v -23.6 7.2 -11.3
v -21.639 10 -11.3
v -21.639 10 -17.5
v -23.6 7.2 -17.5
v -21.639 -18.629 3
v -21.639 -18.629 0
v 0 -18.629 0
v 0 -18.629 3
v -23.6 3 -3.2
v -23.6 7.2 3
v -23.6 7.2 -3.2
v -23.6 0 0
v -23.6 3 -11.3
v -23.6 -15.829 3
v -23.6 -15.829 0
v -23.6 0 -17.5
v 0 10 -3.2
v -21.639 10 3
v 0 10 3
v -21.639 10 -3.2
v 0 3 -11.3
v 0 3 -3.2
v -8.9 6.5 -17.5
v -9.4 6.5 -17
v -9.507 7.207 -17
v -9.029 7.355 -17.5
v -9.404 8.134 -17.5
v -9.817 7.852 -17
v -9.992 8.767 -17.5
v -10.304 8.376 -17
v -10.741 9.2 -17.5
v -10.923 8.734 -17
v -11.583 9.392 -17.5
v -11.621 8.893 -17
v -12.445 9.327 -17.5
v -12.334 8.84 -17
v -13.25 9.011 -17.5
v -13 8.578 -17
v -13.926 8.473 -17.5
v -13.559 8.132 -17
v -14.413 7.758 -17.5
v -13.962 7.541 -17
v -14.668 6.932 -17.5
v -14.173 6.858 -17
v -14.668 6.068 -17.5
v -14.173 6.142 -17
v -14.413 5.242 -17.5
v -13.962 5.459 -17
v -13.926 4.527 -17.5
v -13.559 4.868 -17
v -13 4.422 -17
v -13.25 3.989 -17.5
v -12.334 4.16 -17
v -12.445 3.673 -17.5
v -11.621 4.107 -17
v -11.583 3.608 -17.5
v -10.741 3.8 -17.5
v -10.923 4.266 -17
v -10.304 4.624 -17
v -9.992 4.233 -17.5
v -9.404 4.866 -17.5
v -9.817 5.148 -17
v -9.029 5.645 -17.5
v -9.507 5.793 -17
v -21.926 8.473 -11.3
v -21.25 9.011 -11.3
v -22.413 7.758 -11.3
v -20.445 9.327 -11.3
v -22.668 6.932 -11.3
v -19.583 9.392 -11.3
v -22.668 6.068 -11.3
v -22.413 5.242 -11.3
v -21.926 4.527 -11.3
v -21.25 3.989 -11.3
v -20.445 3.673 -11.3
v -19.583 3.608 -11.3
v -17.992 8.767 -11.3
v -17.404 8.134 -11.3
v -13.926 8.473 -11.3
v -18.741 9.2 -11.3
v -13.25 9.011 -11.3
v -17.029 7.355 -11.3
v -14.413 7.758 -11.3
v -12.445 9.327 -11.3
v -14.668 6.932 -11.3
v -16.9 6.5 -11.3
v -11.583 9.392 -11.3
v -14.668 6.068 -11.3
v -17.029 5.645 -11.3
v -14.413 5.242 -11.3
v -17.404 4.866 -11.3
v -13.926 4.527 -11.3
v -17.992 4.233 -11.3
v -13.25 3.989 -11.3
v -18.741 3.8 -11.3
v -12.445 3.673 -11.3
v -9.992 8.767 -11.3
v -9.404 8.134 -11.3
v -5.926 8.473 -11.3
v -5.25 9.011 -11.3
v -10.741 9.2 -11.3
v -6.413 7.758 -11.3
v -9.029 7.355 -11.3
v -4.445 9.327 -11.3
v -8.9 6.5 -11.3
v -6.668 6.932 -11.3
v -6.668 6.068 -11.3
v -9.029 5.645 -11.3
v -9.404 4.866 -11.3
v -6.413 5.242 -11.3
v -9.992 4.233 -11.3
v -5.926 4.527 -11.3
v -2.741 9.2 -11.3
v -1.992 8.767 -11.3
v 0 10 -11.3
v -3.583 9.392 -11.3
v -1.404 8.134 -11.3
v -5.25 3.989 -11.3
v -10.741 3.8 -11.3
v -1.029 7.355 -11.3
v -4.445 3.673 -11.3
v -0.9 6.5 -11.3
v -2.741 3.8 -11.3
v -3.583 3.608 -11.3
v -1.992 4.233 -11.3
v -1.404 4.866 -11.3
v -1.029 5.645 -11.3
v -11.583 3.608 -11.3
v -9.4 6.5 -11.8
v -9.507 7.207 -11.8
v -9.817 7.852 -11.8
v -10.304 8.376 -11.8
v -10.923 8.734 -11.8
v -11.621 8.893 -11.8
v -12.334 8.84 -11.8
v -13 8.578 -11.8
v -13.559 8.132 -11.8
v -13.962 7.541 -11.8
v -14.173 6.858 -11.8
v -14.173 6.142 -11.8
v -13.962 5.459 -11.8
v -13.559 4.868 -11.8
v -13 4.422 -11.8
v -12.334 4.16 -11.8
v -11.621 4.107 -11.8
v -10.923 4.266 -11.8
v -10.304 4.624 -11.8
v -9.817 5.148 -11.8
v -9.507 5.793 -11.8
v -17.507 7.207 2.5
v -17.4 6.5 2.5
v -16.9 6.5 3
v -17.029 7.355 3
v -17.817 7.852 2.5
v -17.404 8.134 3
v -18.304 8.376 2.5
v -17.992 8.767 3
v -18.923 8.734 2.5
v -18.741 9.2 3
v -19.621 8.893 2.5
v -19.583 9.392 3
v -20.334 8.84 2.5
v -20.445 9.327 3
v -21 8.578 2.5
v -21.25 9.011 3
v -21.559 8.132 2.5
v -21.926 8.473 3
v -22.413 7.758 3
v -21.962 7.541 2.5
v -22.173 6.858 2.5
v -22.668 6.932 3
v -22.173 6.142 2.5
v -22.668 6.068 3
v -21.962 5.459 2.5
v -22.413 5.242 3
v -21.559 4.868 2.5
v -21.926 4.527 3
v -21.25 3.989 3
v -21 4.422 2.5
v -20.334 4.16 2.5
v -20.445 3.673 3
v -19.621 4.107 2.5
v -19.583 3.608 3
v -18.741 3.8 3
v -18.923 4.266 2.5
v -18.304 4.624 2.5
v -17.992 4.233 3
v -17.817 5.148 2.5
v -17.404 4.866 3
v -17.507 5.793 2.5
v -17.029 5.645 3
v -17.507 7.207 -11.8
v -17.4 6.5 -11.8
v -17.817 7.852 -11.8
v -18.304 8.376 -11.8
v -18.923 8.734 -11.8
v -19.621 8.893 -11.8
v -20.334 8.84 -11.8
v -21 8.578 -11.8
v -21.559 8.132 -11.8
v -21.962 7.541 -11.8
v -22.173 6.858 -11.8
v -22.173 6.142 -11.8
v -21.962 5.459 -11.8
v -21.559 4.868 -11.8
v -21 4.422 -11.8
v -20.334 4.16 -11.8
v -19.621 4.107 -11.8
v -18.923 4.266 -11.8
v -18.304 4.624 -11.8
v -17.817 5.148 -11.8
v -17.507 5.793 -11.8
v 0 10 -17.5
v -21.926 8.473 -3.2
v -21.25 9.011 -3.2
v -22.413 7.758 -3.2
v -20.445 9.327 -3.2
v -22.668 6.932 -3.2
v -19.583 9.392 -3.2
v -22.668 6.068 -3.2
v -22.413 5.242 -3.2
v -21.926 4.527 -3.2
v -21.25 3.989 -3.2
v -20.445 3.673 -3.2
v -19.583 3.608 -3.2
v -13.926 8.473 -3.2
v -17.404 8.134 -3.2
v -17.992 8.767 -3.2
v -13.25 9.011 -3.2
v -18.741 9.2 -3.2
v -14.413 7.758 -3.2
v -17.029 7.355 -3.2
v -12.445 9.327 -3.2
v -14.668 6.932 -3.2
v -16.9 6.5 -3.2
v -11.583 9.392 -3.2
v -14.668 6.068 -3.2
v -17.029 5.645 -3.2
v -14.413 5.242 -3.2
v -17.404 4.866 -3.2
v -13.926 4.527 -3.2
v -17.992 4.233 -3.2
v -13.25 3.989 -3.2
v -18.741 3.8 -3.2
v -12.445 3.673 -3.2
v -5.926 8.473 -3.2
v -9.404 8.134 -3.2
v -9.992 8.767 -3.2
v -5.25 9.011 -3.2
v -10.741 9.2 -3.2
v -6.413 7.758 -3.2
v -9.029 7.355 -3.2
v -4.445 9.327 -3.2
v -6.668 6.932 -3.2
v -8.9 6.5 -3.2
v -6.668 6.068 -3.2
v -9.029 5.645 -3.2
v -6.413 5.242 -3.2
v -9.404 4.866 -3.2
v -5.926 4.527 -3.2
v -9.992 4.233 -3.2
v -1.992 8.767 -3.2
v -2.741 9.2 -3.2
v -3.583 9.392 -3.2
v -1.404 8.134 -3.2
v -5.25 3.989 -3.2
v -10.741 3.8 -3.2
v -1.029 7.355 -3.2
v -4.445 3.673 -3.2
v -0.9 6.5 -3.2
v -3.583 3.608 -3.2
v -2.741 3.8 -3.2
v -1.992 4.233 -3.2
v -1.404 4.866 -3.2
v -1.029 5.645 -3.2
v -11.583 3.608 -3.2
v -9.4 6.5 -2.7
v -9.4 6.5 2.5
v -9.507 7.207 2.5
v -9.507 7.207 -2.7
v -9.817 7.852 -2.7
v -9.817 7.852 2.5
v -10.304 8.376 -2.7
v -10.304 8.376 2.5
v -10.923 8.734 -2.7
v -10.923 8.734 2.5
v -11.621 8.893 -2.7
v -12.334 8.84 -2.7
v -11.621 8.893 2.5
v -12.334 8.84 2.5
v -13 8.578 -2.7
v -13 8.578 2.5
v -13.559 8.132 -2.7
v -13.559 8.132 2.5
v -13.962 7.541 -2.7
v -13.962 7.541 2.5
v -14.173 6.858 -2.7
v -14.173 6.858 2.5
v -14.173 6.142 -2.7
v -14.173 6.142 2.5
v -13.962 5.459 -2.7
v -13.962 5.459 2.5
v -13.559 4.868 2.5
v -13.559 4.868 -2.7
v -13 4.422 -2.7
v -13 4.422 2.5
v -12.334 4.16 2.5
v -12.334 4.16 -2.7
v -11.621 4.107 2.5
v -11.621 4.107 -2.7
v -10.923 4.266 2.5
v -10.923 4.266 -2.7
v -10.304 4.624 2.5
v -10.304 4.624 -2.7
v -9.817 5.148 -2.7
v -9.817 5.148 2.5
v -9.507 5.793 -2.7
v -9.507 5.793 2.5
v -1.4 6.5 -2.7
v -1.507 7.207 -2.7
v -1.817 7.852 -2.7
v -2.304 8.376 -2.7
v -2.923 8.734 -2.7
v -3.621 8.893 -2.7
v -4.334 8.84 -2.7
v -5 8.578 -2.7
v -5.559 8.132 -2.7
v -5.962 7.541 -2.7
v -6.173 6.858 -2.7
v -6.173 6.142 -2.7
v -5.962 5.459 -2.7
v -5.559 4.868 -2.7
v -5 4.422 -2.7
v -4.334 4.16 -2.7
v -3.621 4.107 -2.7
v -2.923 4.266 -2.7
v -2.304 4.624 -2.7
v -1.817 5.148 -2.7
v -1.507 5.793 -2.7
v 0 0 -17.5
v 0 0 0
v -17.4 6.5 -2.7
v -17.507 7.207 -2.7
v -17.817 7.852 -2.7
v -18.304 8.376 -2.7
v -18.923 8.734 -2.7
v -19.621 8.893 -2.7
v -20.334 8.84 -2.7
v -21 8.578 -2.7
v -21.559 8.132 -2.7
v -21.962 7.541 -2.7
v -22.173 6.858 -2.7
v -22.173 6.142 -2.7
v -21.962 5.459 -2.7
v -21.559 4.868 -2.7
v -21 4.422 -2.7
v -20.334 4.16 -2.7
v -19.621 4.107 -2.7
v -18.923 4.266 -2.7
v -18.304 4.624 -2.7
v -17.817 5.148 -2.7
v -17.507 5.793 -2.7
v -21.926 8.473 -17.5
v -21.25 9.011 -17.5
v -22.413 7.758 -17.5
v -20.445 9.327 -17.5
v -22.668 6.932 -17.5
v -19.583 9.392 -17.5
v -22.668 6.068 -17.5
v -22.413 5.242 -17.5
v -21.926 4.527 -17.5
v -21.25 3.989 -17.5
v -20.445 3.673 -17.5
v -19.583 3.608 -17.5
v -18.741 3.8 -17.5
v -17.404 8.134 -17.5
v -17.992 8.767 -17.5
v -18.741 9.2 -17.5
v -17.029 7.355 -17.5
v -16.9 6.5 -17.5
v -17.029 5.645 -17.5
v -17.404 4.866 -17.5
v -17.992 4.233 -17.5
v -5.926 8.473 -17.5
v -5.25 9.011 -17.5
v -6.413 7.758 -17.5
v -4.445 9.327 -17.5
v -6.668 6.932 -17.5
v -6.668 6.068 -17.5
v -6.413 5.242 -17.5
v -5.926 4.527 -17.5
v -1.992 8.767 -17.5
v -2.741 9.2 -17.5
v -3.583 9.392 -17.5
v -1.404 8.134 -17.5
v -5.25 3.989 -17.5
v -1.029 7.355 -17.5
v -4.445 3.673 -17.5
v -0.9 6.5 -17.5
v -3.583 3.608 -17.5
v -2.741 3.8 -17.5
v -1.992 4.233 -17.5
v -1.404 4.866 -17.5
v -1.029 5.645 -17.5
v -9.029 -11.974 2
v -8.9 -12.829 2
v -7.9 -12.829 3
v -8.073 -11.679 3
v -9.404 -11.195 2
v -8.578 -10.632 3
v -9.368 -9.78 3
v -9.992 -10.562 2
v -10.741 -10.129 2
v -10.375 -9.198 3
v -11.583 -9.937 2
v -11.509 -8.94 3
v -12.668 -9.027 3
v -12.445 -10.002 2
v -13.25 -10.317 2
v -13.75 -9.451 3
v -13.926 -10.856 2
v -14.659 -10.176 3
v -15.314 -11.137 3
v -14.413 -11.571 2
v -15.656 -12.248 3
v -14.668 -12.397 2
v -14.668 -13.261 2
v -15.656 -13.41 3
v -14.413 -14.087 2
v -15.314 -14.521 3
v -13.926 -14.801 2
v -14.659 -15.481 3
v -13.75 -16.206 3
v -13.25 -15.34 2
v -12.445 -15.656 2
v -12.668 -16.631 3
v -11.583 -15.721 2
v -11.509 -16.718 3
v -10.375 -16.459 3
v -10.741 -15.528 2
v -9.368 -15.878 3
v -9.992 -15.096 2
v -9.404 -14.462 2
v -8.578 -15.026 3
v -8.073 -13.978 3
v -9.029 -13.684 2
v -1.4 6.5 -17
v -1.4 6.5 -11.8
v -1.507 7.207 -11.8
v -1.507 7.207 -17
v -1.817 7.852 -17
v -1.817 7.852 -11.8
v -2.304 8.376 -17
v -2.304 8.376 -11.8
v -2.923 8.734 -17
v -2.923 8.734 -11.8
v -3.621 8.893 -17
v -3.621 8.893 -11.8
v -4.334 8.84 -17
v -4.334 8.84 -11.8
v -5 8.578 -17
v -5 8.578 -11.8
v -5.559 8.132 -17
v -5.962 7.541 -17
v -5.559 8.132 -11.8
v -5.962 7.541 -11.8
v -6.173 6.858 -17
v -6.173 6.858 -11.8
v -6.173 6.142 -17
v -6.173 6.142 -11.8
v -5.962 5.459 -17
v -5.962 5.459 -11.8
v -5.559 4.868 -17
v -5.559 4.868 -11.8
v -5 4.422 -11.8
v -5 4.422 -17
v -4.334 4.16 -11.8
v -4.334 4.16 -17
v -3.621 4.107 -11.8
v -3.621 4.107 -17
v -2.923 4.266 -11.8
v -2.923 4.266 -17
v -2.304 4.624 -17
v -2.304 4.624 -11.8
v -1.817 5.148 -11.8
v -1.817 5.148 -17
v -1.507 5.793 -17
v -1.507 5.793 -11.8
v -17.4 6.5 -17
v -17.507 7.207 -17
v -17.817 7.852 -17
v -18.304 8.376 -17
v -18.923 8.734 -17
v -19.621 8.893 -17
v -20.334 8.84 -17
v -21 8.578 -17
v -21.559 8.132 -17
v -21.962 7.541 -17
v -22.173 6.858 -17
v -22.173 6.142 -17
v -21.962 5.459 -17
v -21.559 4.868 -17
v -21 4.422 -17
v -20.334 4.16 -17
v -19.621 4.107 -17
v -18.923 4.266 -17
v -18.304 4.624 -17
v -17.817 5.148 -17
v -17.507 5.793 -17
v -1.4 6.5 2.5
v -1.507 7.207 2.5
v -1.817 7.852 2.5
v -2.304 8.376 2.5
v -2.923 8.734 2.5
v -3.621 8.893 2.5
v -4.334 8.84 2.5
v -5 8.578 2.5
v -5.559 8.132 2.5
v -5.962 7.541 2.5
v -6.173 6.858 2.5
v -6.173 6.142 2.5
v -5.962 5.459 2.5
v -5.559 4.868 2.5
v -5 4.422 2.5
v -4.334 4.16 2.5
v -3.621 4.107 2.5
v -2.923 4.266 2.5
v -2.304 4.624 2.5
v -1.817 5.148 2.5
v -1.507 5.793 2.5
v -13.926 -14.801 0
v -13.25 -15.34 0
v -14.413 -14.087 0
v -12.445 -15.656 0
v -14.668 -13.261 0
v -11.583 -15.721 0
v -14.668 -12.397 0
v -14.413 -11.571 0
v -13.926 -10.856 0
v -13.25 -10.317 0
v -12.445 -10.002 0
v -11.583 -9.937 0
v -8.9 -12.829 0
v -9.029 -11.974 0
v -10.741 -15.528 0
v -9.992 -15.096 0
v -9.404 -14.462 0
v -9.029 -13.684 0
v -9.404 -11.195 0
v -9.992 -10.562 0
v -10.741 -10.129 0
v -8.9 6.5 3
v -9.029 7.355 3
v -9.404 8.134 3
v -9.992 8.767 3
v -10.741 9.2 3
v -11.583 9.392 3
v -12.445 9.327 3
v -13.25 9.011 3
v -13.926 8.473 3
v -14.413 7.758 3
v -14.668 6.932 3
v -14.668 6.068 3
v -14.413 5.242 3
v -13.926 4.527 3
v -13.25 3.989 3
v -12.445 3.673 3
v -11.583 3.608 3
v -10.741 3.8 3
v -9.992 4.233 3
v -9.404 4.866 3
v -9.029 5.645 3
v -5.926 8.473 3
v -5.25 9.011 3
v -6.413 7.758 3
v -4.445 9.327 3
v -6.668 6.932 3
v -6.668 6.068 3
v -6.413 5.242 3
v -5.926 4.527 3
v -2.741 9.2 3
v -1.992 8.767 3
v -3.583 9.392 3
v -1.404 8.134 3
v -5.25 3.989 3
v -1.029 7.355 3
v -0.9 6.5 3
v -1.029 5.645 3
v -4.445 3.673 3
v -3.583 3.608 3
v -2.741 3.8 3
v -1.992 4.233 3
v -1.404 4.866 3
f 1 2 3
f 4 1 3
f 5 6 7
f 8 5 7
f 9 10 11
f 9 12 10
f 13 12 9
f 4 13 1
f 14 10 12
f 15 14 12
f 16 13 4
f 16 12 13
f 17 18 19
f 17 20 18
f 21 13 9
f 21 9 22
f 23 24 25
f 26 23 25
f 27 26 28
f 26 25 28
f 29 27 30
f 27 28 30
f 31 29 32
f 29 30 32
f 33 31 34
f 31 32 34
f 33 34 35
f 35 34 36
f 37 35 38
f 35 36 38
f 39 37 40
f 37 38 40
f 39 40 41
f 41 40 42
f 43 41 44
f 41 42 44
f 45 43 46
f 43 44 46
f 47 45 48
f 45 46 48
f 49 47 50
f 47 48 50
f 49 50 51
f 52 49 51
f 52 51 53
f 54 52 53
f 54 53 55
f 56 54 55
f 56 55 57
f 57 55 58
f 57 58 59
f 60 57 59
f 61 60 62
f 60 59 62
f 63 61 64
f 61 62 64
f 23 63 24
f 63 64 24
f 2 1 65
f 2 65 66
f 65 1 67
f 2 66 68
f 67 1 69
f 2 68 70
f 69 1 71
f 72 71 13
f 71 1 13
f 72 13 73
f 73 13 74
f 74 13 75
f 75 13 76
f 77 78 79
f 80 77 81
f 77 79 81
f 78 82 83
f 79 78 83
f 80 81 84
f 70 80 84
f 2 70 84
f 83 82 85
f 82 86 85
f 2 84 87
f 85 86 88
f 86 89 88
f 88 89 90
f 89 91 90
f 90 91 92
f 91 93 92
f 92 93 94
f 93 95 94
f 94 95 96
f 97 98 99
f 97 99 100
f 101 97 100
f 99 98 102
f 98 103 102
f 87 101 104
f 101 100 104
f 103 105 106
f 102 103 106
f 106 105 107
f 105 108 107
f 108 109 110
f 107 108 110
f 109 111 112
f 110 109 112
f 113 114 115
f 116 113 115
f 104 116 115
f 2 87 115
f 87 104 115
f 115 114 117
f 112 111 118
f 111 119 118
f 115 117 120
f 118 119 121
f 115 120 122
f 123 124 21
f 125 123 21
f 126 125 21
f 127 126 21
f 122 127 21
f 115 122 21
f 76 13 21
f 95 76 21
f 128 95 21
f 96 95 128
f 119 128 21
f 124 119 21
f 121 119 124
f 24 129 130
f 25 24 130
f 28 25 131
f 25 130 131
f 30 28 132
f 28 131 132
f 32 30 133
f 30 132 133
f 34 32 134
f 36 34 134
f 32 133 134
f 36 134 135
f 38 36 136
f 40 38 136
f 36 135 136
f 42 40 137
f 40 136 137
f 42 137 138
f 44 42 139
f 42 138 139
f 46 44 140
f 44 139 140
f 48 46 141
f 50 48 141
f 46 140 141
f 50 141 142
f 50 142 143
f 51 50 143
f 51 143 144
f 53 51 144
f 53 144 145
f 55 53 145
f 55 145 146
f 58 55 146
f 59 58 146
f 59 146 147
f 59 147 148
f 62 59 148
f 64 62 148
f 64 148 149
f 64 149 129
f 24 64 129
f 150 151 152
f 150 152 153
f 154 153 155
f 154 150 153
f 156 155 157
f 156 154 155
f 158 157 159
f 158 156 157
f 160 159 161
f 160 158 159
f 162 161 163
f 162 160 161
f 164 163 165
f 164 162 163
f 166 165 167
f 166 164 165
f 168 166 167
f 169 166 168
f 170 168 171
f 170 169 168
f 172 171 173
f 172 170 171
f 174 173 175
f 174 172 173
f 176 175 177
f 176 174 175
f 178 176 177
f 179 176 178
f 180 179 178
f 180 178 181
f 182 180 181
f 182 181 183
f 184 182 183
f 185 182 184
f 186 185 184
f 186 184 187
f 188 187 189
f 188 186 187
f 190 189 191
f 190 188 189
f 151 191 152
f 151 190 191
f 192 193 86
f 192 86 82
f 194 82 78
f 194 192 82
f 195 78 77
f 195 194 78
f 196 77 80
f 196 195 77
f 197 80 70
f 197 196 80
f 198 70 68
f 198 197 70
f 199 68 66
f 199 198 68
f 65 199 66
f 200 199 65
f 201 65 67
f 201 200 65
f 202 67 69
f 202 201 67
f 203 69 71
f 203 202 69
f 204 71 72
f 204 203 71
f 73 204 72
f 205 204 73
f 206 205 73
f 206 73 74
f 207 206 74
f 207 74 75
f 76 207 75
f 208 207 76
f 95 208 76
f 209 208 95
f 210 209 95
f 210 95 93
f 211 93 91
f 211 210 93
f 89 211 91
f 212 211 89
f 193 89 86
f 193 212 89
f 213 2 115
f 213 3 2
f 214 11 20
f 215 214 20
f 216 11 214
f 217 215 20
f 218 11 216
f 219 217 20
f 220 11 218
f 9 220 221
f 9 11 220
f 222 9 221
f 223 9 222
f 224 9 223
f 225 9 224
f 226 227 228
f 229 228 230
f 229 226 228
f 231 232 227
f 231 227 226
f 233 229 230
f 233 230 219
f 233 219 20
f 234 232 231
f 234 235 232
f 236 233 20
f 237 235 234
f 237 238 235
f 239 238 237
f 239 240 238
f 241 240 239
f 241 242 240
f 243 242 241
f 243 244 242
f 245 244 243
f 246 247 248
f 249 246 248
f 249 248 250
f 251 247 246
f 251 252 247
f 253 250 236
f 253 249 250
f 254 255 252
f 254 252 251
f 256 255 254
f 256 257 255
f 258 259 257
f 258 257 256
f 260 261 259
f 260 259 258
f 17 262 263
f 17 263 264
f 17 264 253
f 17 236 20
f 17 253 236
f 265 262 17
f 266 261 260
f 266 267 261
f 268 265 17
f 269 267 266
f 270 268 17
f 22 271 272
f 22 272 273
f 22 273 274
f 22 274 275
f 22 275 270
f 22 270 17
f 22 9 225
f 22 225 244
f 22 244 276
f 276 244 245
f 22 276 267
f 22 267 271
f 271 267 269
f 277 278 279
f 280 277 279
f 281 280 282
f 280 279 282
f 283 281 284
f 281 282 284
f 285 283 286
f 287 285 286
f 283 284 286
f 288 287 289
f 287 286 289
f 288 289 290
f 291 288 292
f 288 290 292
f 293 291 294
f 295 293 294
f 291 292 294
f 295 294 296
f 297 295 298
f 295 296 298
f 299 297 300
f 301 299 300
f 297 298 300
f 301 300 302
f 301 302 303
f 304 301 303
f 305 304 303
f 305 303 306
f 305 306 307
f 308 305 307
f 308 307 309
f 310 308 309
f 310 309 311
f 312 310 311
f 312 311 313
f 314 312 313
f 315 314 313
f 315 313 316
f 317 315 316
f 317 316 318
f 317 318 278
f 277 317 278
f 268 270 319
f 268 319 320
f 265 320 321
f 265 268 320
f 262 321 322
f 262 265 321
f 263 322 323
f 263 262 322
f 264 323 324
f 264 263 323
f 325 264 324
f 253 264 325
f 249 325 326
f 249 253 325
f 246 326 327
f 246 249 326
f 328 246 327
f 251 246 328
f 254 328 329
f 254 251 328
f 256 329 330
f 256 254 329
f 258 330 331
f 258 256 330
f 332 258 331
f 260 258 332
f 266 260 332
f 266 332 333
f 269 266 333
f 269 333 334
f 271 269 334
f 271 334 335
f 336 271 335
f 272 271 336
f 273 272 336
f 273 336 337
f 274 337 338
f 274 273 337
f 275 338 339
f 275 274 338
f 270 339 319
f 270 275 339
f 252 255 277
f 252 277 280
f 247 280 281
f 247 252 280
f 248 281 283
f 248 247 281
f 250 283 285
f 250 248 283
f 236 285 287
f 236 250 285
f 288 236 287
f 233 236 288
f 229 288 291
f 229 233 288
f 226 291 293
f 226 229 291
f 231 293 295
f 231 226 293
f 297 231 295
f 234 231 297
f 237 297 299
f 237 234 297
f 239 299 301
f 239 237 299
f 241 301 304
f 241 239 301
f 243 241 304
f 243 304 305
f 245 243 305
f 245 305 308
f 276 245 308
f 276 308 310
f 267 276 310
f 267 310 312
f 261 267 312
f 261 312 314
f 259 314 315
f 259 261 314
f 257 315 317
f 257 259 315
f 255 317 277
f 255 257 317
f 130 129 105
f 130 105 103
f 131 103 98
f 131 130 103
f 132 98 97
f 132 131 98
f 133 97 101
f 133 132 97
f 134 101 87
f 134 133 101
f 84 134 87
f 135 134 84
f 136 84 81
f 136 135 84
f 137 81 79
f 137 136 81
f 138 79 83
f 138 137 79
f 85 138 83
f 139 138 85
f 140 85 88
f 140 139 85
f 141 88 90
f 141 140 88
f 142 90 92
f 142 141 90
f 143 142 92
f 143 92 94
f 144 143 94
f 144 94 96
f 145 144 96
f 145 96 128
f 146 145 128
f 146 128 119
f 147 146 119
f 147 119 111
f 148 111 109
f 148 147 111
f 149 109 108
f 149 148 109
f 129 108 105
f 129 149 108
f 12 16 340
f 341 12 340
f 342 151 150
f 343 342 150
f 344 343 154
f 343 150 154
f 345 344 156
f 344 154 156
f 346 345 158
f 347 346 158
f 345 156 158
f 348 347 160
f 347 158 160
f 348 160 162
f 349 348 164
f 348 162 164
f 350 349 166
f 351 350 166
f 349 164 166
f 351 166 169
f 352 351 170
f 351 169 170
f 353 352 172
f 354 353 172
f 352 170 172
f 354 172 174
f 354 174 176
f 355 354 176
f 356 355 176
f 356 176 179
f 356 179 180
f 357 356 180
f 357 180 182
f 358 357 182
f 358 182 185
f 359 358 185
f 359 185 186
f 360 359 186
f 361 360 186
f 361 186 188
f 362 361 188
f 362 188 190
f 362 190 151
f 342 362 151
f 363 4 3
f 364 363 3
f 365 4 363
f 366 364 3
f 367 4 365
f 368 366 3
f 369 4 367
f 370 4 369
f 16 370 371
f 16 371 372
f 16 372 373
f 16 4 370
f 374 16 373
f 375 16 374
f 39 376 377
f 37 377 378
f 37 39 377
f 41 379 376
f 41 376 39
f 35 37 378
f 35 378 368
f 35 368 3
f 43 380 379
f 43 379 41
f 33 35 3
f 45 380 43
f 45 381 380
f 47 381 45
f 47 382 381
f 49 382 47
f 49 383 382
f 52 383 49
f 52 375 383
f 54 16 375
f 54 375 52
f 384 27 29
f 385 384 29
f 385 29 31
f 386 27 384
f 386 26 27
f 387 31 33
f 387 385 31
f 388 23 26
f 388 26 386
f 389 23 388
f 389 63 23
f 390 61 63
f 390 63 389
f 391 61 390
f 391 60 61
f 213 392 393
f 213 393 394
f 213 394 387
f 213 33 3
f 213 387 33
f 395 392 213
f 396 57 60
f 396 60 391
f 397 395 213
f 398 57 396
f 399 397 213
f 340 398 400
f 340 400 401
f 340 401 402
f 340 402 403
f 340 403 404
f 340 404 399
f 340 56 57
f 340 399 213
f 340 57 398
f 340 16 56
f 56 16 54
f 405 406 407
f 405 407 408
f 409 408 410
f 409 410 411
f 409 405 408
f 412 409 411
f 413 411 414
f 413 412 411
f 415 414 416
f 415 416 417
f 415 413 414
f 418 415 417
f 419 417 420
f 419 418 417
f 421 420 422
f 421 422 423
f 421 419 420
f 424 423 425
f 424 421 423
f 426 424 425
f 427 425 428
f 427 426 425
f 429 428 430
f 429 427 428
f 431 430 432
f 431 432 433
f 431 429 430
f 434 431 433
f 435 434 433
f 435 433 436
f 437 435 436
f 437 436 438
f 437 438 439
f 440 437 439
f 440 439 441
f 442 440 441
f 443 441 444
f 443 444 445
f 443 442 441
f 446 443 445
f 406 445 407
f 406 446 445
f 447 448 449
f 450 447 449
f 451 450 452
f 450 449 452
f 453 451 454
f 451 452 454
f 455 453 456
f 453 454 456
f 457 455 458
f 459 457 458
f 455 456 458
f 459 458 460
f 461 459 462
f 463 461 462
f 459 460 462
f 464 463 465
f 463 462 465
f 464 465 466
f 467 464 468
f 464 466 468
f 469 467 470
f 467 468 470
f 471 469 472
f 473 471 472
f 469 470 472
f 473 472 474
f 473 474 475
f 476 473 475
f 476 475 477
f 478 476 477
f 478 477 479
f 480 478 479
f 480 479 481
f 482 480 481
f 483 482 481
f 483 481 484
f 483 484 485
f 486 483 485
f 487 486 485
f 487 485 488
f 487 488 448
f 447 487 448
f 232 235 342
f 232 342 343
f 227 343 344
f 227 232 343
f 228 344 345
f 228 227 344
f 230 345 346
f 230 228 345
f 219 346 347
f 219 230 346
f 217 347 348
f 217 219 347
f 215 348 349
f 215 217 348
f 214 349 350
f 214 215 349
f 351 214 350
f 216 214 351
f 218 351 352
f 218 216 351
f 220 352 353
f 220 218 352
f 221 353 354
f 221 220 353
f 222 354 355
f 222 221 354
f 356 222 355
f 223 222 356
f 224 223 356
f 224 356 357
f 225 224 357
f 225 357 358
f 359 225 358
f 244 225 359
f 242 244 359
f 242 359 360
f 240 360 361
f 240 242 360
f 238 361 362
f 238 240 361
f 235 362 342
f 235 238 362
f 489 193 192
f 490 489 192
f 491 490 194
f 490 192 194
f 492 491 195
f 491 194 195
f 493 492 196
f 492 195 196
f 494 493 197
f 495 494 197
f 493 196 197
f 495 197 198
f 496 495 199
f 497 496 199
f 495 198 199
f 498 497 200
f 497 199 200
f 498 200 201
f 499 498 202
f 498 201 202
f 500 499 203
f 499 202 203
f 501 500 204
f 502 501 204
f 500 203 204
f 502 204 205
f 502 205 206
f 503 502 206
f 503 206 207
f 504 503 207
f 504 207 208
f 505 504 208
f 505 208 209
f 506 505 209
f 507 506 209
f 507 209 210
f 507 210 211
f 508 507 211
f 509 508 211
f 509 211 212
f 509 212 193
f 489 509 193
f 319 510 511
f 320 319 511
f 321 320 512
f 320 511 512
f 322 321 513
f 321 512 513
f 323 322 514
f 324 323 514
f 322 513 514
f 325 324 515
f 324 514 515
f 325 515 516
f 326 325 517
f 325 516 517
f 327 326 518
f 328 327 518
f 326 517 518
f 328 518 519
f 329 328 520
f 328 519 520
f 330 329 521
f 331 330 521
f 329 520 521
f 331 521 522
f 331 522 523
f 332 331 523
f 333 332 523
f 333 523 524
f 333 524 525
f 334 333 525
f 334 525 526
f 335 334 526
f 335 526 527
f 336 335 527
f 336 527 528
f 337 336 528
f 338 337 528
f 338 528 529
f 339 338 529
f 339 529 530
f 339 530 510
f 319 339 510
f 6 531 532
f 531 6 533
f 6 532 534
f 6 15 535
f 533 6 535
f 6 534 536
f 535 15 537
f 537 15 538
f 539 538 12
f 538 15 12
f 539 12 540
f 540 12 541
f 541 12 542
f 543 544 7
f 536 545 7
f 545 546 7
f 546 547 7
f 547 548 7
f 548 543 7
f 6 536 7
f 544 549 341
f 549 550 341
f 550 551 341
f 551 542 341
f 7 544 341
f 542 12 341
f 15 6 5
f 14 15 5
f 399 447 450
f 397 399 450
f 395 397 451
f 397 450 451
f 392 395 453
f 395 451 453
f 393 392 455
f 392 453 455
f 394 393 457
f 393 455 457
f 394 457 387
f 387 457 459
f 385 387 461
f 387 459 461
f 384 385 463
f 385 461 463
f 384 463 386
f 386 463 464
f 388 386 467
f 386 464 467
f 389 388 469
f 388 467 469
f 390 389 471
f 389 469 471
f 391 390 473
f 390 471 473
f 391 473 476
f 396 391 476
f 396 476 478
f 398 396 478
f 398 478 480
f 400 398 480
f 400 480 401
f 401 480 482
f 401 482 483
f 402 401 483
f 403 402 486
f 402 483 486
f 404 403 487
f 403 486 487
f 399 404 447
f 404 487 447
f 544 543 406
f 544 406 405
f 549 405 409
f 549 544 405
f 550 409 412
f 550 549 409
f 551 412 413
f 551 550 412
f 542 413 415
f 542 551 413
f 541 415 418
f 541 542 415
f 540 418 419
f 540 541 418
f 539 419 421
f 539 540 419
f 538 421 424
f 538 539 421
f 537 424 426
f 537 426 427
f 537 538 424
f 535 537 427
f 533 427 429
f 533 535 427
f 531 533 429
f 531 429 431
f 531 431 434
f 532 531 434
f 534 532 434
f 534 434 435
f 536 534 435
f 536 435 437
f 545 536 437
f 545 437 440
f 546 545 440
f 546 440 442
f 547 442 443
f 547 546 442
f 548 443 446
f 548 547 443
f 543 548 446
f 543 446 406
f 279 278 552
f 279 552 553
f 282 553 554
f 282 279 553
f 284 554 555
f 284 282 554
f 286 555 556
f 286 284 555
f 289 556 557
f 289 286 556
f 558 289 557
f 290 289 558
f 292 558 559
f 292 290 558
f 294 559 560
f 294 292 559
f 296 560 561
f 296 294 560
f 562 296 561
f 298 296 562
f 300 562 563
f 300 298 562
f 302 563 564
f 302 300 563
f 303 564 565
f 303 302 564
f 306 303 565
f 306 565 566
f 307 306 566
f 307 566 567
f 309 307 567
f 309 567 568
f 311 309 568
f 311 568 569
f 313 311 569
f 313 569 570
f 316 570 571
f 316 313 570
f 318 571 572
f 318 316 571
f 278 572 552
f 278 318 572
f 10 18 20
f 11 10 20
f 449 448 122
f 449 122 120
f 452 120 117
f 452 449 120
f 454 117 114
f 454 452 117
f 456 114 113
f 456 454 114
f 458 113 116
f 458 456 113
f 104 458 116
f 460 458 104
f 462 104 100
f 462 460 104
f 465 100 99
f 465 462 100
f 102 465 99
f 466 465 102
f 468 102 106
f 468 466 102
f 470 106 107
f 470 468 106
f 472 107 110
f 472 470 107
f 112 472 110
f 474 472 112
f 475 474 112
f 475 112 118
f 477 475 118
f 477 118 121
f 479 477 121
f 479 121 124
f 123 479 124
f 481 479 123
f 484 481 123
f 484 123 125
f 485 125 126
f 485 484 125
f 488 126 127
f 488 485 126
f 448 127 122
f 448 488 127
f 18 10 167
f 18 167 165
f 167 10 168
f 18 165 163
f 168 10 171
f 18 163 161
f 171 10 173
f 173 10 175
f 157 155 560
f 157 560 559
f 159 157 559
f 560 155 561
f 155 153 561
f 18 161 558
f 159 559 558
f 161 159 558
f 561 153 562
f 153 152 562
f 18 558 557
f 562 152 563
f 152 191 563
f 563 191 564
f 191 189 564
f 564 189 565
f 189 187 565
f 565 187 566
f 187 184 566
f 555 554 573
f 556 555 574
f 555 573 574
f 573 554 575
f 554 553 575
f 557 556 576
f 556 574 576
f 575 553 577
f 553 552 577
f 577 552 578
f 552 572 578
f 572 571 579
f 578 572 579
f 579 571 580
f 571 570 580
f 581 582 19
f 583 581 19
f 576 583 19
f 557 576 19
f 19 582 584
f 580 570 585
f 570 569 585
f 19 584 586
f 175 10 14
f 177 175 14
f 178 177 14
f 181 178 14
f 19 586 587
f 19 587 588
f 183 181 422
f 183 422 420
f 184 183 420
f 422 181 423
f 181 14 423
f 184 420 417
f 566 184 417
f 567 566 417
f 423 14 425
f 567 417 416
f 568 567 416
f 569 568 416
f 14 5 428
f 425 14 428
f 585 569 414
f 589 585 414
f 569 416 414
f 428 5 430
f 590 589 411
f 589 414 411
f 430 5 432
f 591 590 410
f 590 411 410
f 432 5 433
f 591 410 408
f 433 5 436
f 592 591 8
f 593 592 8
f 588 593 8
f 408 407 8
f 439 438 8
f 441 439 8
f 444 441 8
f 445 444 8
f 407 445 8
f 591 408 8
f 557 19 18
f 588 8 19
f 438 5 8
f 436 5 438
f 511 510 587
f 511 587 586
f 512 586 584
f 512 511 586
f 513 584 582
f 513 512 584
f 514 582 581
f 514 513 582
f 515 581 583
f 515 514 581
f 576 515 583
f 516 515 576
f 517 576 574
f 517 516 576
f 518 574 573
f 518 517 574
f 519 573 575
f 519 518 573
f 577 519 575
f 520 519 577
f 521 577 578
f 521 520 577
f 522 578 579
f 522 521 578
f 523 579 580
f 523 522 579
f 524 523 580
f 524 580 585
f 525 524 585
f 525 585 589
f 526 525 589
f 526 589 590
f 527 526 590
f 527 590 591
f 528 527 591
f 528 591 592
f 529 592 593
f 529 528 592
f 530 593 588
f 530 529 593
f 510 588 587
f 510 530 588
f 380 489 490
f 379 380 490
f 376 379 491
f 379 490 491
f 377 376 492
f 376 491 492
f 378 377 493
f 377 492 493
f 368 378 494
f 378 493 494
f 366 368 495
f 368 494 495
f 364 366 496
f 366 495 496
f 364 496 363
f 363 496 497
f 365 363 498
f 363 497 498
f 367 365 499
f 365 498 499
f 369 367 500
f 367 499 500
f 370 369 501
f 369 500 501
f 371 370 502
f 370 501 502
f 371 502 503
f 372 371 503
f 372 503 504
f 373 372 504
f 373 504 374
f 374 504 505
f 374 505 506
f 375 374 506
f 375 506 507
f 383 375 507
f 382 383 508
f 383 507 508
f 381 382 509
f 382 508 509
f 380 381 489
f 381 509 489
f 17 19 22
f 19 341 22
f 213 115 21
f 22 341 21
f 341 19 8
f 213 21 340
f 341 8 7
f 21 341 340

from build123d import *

# Parameters (mm, degrees)
SKETCH1_R           = 2.9
BOSS_EXTRUDE1_DEPTH = 3
SKETCH2_W           = 23.6
SKETCH2_H           = 20.5
BOSS_EXTRUDE2_DEPTH = 3
SKETCH3_W           = 23.6
SKETCH3_H           = 6.2
BOSS_EXTRUDE3_DEPTH = 7
SKETCH4_R           = 2.4
CUT_EXTRUDE2_DEPTH  = 37.390148045
CHAMFER1_SIZE       = 2.8
CHAMFER1_SIZE2      = 1.960581107
CHAMFER2_SIZE       = 1
CHAMFER3_SIZE       = 0.5


with BuildPart() as part:
    # Sketch1 → Boss-Extrude1 (new body)
    with BuildSketch(Plane.XY):
        Polygon((0, 0), (-23.6, 0), (-23.6, -14.4), (-23.6, -18.628818394), (-19.3, -18.628818394), (-4.3, -18.628818394), (0, -18.628818394), (0, -14.256438623), align=None)
        with Locations((-11.8, -12.828818394)):
            Circle(SKETCH1_R, mode=Mode.SUBTRACT)
    extrude(amount=BOSS_EXTRUDE1_DEPTH)

    # Sketch2 → Boss-Extrude2 (add)
    with BuildSketch(Plane(origin=(0, 0, 0), x_dir=(1, 0, 0), z_dir=(0, 1, 0))):
        with Locations((-11.8, 7.25)):
            Rectangle(SKETCH2_W, SKETCH2_H)
    extrude(amount=BOSS_EXTRUDE2_DEPTH)

    # Sketch3 → Boss-Extrude3 (add)
    with BuildSketch(Plane(origin=(0, 3, 0), x_dir=(1, 0, 0), z_dir=(0, 1, 0))):
        with Locations((-11.8, 0.1)):
            Rectangle(SKETCH3_W, SKETCH3_H)
        with Locations((-11.8, 14.4)):
            Rectangle(SKETCH3_W, SKETCH3_H)
    extrude(amount=BOSS_EXTRUDE3_DEPTH)

    # Sketch4 → Cut-Extrude2 (cut, through all)
    with BuildSketch(Plane.XY.offset(3)):
        with Locations((-11.8, 6.5)):
            Circle(SKETCH4_R)
        with Locations((-19.8, 6.5)):
            Circle(SKETCH4_R)
        with Locations((-3.8, 6.5)):
            Circle(SKETCH4_R)
    extrude(amount=-CUT_EXTRUDE2_DEPTH, mode=Mode.SUBTRACT)

    # Chamfer1
    chamfer1_edges = [part.edges().sort_by_distance(p)[0] for p in [
        (-23.6, -18.628818394, 1.5),
        (-23.6, 10, -0.1),
        (-23.6, 10, -14.4),
    ]]
    chamfer1_side = [part.faces().sort_by_distance(p)[0] for p in [
        (-23.6, 0.665571513, -4.855098328),
    ]]
    chamfer(chamfer1_edges, length=CHAMFER1_SIZE, length2=CHAMFER1_SIZE2, reference=chamfer1_side[0])

    # Chamfer2
    chamfer2_edges = [part.edges().sort_by_distance(p)[0] for p in [
        (-14.7, -12.828818394, 3),
    ]]
    chamfer(chamfer2_edges, length=CHAMFER2_SIZE)

    # Chamfer3
    chamfer3_edges = [part.edges().sort_by_distance(p)[0] for p in [
        (-6.2, 6.5, -3.2),
        (-6.2, 6.5, -17.5),
        (-6.2, 6.5, -11.3),
        (-6.2, 6.5, 3),
        (-22.2, 6.5, -3.2),
        (-22.2, 6.5, -17.5),
        (-22.2, 6.5, -11.3),
        (-22.2, 6.5, 3),
        (-14.2, 6.5, -3.2),
        (-14.2, 6.5, -17.5),
        (-14.2, 6.5, -11.3),
        (-14.2, 6.5, 3),
    ]]
    chamfer(chamfer3_edges, length=CHAMFER3_SIZE)


solid = part.part
